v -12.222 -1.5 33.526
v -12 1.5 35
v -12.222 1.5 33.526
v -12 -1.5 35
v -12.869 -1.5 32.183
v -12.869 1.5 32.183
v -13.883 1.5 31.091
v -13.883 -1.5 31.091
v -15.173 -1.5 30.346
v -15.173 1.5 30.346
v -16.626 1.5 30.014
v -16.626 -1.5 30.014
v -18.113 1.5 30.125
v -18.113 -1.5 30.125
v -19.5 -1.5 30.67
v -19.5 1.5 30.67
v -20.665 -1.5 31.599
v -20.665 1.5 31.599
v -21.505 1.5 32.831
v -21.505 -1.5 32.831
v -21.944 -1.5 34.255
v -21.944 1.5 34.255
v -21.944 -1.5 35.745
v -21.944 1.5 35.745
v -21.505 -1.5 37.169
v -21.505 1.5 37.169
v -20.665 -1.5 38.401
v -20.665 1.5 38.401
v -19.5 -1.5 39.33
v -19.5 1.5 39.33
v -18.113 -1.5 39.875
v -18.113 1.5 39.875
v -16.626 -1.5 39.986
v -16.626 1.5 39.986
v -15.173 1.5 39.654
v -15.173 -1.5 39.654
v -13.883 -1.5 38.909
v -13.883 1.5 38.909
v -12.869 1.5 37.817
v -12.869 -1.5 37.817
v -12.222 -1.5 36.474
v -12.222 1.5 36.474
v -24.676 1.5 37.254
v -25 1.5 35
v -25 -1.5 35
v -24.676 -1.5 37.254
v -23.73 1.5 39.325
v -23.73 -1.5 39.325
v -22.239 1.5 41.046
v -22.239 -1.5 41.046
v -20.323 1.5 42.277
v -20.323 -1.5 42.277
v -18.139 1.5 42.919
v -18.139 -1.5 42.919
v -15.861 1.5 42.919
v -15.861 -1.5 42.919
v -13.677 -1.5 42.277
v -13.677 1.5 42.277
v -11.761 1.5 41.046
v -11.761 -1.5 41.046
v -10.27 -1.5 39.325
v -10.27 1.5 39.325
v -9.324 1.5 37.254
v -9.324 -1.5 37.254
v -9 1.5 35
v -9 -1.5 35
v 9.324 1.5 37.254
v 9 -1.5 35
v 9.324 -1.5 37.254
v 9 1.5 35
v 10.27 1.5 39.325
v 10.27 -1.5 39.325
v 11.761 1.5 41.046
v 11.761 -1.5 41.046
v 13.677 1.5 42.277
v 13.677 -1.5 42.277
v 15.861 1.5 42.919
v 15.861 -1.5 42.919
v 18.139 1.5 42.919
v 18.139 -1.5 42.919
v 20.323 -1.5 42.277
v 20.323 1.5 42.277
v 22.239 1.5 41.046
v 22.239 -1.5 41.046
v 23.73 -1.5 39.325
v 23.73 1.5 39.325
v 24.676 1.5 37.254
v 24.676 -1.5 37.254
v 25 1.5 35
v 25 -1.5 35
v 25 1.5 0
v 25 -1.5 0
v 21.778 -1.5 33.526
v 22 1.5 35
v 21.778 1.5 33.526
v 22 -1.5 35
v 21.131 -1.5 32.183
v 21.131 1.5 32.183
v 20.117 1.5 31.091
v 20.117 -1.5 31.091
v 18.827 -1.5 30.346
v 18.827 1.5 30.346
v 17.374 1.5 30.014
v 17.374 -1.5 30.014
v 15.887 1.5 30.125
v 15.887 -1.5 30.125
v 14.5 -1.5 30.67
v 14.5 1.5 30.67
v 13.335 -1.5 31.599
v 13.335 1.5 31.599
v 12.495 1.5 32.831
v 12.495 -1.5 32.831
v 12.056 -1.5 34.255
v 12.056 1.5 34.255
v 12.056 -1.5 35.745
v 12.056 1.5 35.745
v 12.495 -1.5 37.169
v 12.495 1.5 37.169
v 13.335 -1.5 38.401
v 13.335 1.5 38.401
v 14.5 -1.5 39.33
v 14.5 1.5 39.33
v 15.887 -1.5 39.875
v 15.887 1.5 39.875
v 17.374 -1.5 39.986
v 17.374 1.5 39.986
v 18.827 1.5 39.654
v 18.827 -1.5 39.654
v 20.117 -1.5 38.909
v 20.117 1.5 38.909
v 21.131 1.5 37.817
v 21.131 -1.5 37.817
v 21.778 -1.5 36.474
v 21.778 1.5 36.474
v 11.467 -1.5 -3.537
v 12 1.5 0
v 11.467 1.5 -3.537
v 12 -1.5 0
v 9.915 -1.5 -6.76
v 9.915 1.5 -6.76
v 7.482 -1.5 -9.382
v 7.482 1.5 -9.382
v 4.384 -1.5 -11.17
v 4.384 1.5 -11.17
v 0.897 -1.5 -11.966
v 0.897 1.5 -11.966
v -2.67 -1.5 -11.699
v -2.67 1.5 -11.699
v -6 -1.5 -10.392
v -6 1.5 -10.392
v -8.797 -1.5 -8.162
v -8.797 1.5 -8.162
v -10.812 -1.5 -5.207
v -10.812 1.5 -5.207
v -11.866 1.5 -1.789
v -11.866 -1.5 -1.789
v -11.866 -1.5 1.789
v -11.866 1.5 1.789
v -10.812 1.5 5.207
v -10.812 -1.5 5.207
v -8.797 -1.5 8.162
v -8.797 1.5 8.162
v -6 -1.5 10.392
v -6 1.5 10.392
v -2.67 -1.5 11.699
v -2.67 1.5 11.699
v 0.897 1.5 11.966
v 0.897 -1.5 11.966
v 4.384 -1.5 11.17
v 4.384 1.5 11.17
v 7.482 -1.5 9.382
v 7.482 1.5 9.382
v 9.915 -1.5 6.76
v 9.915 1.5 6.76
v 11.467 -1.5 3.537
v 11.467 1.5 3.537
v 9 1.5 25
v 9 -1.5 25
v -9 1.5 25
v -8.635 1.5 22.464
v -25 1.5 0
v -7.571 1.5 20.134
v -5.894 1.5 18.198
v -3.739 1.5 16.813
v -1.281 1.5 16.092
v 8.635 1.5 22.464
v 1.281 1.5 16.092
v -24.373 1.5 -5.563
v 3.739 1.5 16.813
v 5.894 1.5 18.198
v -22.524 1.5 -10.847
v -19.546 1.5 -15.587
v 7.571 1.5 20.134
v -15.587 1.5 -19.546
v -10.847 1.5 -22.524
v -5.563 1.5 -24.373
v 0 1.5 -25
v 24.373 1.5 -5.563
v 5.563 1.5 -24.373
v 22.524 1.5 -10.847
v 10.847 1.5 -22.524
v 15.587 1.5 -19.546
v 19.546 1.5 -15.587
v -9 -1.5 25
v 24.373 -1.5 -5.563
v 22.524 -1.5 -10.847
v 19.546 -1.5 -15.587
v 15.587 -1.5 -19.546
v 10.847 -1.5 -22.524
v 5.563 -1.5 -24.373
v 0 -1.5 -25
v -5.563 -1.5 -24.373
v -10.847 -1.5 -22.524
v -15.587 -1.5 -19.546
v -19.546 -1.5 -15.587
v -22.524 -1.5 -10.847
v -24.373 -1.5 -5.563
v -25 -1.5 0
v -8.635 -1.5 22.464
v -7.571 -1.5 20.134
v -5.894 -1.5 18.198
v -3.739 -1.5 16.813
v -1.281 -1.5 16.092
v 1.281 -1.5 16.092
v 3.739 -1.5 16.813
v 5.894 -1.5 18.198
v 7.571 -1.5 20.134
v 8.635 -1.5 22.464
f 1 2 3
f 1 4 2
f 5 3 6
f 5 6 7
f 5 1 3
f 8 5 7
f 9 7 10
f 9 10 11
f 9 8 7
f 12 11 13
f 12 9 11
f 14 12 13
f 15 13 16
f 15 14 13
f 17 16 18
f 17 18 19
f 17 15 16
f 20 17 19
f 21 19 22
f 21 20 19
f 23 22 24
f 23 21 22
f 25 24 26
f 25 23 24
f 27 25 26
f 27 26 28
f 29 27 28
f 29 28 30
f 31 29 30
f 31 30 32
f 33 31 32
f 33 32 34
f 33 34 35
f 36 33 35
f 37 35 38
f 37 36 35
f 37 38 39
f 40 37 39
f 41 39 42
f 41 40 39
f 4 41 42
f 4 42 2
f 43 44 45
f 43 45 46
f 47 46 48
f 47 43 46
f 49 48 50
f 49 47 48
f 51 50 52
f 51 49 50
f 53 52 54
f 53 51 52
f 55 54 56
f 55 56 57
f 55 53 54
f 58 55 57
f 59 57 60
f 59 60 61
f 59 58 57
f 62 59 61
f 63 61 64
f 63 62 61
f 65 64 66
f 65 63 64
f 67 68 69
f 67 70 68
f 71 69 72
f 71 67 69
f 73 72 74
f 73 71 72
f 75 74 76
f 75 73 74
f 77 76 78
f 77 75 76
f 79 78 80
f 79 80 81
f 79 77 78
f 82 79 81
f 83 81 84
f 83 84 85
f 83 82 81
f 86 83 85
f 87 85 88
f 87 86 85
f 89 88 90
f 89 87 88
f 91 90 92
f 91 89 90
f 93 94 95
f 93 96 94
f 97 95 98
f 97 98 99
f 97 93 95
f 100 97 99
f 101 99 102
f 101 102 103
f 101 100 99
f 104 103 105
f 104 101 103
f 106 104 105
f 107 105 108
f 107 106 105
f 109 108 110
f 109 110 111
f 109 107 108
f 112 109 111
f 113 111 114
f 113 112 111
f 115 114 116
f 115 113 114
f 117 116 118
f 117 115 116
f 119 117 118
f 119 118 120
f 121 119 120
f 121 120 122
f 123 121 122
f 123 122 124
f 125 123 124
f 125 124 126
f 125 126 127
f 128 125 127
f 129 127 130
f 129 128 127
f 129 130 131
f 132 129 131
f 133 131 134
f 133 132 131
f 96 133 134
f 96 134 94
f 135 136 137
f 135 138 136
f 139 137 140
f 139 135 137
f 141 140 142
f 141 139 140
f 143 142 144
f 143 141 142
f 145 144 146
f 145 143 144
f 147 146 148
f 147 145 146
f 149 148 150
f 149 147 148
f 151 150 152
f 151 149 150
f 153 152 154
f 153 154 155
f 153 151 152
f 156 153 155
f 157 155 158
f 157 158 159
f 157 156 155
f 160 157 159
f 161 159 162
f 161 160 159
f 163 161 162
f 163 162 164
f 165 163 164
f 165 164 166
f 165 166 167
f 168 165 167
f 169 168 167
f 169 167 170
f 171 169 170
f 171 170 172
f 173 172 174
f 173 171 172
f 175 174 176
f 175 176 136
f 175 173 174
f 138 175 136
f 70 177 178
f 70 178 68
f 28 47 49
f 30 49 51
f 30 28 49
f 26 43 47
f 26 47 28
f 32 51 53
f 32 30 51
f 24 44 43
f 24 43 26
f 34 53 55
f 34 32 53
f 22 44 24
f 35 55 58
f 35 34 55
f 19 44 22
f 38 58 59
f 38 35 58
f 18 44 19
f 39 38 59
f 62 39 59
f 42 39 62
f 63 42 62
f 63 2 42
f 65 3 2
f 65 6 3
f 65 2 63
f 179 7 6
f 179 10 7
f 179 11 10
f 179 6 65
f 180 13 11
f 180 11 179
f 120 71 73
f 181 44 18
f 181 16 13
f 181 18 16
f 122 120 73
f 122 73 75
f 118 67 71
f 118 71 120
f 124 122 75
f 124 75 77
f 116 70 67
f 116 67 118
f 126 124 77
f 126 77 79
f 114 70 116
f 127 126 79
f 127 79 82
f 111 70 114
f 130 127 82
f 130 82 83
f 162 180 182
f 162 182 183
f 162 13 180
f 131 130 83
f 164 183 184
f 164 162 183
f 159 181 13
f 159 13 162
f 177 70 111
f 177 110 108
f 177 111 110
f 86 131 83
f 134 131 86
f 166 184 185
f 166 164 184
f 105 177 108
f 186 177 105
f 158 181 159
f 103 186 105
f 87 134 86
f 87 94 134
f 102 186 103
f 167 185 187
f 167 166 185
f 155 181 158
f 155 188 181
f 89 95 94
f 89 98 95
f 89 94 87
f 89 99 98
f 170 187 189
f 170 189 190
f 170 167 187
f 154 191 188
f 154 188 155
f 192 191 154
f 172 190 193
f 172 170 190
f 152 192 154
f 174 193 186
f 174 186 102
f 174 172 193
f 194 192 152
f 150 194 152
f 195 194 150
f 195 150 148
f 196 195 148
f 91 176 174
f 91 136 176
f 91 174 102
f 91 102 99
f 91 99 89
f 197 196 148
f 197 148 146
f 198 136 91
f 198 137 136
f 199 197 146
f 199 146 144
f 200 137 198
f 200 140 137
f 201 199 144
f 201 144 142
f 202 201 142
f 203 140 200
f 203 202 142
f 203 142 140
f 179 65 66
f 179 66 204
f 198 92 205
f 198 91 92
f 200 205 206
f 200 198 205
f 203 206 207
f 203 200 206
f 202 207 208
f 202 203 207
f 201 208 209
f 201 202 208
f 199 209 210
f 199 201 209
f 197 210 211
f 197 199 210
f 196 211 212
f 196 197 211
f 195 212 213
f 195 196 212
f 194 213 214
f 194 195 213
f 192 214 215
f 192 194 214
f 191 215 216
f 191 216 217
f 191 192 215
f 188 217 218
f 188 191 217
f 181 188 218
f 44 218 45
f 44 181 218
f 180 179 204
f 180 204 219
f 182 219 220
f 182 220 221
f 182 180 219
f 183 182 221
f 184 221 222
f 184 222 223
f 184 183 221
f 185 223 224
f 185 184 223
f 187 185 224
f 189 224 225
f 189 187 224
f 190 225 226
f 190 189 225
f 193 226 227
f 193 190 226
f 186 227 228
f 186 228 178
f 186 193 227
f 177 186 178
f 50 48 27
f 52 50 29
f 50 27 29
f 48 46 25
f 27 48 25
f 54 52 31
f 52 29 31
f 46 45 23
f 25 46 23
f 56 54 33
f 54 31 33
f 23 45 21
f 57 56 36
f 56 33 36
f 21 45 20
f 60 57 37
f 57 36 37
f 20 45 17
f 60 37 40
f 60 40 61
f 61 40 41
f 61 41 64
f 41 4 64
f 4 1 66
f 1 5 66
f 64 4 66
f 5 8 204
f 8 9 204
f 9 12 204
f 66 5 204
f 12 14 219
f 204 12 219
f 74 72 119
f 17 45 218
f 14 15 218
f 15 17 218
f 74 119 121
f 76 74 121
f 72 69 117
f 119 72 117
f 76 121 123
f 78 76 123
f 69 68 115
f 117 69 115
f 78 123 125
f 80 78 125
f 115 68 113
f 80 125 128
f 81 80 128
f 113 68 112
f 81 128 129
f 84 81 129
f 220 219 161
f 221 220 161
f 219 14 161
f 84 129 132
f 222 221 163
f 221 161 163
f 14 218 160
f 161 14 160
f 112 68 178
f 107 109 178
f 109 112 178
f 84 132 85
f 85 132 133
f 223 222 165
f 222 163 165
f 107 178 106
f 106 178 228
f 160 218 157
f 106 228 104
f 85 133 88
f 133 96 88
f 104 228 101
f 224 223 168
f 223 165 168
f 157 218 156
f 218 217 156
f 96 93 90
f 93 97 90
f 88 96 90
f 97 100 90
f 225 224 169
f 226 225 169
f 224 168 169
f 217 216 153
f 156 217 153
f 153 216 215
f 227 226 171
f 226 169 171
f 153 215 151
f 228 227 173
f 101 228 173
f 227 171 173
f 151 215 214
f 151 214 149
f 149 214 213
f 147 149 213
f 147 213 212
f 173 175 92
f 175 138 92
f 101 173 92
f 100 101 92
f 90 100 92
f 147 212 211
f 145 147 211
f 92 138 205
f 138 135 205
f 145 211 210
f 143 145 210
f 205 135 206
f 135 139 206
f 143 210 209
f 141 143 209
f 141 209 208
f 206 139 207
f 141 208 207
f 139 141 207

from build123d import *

# Parameters (mm, degrees)
SKETCH1_R           = 12
SKETCH1_R_2         = 5
BOSS_EXTRUDE2_DEPTH = 1.5


with BuildPart() as part:
    # Sketch1 → Boss-Extrude2 (new body, symmetric)
    with BuildSketch(Plane(origin=(0, 0, 0), x_dir=(1, 0, 0), z_dir=(0, 1, 0))):
        with BuildLine():
            Line((-25, 0), (-25, -35))
            ThreePointArc((-25, -35), (-17, -43), (-9, -35))
            Line((-9, -35), (-9, -25))
            ThreePointArc((-9, -25), (0, -16), (9, -25))
            Line((9, -25), (9, -35))
            ThreePointArc((9, -35), (17, -43), (25, -35))
            Line((25, -35), (25, 0))
            ThreePointArc((25, 0), (0, 25), (-25, 0))
        make_face()
        Circle(SKETCH1_R, mode=Mode.SUBTRACT)
        with Locations((17, -35)):
            Circle(SKETCH1_R_2, mode=Mode.SUBTRACT)
        with Locations((-17, -35)):
            Circle(SKETCH1_R_2, mode=Mode.SUBTRACT)
    extrude(amount=BOSS_EXTRUDE2_DEPTH, both=True)


solid = part.part
